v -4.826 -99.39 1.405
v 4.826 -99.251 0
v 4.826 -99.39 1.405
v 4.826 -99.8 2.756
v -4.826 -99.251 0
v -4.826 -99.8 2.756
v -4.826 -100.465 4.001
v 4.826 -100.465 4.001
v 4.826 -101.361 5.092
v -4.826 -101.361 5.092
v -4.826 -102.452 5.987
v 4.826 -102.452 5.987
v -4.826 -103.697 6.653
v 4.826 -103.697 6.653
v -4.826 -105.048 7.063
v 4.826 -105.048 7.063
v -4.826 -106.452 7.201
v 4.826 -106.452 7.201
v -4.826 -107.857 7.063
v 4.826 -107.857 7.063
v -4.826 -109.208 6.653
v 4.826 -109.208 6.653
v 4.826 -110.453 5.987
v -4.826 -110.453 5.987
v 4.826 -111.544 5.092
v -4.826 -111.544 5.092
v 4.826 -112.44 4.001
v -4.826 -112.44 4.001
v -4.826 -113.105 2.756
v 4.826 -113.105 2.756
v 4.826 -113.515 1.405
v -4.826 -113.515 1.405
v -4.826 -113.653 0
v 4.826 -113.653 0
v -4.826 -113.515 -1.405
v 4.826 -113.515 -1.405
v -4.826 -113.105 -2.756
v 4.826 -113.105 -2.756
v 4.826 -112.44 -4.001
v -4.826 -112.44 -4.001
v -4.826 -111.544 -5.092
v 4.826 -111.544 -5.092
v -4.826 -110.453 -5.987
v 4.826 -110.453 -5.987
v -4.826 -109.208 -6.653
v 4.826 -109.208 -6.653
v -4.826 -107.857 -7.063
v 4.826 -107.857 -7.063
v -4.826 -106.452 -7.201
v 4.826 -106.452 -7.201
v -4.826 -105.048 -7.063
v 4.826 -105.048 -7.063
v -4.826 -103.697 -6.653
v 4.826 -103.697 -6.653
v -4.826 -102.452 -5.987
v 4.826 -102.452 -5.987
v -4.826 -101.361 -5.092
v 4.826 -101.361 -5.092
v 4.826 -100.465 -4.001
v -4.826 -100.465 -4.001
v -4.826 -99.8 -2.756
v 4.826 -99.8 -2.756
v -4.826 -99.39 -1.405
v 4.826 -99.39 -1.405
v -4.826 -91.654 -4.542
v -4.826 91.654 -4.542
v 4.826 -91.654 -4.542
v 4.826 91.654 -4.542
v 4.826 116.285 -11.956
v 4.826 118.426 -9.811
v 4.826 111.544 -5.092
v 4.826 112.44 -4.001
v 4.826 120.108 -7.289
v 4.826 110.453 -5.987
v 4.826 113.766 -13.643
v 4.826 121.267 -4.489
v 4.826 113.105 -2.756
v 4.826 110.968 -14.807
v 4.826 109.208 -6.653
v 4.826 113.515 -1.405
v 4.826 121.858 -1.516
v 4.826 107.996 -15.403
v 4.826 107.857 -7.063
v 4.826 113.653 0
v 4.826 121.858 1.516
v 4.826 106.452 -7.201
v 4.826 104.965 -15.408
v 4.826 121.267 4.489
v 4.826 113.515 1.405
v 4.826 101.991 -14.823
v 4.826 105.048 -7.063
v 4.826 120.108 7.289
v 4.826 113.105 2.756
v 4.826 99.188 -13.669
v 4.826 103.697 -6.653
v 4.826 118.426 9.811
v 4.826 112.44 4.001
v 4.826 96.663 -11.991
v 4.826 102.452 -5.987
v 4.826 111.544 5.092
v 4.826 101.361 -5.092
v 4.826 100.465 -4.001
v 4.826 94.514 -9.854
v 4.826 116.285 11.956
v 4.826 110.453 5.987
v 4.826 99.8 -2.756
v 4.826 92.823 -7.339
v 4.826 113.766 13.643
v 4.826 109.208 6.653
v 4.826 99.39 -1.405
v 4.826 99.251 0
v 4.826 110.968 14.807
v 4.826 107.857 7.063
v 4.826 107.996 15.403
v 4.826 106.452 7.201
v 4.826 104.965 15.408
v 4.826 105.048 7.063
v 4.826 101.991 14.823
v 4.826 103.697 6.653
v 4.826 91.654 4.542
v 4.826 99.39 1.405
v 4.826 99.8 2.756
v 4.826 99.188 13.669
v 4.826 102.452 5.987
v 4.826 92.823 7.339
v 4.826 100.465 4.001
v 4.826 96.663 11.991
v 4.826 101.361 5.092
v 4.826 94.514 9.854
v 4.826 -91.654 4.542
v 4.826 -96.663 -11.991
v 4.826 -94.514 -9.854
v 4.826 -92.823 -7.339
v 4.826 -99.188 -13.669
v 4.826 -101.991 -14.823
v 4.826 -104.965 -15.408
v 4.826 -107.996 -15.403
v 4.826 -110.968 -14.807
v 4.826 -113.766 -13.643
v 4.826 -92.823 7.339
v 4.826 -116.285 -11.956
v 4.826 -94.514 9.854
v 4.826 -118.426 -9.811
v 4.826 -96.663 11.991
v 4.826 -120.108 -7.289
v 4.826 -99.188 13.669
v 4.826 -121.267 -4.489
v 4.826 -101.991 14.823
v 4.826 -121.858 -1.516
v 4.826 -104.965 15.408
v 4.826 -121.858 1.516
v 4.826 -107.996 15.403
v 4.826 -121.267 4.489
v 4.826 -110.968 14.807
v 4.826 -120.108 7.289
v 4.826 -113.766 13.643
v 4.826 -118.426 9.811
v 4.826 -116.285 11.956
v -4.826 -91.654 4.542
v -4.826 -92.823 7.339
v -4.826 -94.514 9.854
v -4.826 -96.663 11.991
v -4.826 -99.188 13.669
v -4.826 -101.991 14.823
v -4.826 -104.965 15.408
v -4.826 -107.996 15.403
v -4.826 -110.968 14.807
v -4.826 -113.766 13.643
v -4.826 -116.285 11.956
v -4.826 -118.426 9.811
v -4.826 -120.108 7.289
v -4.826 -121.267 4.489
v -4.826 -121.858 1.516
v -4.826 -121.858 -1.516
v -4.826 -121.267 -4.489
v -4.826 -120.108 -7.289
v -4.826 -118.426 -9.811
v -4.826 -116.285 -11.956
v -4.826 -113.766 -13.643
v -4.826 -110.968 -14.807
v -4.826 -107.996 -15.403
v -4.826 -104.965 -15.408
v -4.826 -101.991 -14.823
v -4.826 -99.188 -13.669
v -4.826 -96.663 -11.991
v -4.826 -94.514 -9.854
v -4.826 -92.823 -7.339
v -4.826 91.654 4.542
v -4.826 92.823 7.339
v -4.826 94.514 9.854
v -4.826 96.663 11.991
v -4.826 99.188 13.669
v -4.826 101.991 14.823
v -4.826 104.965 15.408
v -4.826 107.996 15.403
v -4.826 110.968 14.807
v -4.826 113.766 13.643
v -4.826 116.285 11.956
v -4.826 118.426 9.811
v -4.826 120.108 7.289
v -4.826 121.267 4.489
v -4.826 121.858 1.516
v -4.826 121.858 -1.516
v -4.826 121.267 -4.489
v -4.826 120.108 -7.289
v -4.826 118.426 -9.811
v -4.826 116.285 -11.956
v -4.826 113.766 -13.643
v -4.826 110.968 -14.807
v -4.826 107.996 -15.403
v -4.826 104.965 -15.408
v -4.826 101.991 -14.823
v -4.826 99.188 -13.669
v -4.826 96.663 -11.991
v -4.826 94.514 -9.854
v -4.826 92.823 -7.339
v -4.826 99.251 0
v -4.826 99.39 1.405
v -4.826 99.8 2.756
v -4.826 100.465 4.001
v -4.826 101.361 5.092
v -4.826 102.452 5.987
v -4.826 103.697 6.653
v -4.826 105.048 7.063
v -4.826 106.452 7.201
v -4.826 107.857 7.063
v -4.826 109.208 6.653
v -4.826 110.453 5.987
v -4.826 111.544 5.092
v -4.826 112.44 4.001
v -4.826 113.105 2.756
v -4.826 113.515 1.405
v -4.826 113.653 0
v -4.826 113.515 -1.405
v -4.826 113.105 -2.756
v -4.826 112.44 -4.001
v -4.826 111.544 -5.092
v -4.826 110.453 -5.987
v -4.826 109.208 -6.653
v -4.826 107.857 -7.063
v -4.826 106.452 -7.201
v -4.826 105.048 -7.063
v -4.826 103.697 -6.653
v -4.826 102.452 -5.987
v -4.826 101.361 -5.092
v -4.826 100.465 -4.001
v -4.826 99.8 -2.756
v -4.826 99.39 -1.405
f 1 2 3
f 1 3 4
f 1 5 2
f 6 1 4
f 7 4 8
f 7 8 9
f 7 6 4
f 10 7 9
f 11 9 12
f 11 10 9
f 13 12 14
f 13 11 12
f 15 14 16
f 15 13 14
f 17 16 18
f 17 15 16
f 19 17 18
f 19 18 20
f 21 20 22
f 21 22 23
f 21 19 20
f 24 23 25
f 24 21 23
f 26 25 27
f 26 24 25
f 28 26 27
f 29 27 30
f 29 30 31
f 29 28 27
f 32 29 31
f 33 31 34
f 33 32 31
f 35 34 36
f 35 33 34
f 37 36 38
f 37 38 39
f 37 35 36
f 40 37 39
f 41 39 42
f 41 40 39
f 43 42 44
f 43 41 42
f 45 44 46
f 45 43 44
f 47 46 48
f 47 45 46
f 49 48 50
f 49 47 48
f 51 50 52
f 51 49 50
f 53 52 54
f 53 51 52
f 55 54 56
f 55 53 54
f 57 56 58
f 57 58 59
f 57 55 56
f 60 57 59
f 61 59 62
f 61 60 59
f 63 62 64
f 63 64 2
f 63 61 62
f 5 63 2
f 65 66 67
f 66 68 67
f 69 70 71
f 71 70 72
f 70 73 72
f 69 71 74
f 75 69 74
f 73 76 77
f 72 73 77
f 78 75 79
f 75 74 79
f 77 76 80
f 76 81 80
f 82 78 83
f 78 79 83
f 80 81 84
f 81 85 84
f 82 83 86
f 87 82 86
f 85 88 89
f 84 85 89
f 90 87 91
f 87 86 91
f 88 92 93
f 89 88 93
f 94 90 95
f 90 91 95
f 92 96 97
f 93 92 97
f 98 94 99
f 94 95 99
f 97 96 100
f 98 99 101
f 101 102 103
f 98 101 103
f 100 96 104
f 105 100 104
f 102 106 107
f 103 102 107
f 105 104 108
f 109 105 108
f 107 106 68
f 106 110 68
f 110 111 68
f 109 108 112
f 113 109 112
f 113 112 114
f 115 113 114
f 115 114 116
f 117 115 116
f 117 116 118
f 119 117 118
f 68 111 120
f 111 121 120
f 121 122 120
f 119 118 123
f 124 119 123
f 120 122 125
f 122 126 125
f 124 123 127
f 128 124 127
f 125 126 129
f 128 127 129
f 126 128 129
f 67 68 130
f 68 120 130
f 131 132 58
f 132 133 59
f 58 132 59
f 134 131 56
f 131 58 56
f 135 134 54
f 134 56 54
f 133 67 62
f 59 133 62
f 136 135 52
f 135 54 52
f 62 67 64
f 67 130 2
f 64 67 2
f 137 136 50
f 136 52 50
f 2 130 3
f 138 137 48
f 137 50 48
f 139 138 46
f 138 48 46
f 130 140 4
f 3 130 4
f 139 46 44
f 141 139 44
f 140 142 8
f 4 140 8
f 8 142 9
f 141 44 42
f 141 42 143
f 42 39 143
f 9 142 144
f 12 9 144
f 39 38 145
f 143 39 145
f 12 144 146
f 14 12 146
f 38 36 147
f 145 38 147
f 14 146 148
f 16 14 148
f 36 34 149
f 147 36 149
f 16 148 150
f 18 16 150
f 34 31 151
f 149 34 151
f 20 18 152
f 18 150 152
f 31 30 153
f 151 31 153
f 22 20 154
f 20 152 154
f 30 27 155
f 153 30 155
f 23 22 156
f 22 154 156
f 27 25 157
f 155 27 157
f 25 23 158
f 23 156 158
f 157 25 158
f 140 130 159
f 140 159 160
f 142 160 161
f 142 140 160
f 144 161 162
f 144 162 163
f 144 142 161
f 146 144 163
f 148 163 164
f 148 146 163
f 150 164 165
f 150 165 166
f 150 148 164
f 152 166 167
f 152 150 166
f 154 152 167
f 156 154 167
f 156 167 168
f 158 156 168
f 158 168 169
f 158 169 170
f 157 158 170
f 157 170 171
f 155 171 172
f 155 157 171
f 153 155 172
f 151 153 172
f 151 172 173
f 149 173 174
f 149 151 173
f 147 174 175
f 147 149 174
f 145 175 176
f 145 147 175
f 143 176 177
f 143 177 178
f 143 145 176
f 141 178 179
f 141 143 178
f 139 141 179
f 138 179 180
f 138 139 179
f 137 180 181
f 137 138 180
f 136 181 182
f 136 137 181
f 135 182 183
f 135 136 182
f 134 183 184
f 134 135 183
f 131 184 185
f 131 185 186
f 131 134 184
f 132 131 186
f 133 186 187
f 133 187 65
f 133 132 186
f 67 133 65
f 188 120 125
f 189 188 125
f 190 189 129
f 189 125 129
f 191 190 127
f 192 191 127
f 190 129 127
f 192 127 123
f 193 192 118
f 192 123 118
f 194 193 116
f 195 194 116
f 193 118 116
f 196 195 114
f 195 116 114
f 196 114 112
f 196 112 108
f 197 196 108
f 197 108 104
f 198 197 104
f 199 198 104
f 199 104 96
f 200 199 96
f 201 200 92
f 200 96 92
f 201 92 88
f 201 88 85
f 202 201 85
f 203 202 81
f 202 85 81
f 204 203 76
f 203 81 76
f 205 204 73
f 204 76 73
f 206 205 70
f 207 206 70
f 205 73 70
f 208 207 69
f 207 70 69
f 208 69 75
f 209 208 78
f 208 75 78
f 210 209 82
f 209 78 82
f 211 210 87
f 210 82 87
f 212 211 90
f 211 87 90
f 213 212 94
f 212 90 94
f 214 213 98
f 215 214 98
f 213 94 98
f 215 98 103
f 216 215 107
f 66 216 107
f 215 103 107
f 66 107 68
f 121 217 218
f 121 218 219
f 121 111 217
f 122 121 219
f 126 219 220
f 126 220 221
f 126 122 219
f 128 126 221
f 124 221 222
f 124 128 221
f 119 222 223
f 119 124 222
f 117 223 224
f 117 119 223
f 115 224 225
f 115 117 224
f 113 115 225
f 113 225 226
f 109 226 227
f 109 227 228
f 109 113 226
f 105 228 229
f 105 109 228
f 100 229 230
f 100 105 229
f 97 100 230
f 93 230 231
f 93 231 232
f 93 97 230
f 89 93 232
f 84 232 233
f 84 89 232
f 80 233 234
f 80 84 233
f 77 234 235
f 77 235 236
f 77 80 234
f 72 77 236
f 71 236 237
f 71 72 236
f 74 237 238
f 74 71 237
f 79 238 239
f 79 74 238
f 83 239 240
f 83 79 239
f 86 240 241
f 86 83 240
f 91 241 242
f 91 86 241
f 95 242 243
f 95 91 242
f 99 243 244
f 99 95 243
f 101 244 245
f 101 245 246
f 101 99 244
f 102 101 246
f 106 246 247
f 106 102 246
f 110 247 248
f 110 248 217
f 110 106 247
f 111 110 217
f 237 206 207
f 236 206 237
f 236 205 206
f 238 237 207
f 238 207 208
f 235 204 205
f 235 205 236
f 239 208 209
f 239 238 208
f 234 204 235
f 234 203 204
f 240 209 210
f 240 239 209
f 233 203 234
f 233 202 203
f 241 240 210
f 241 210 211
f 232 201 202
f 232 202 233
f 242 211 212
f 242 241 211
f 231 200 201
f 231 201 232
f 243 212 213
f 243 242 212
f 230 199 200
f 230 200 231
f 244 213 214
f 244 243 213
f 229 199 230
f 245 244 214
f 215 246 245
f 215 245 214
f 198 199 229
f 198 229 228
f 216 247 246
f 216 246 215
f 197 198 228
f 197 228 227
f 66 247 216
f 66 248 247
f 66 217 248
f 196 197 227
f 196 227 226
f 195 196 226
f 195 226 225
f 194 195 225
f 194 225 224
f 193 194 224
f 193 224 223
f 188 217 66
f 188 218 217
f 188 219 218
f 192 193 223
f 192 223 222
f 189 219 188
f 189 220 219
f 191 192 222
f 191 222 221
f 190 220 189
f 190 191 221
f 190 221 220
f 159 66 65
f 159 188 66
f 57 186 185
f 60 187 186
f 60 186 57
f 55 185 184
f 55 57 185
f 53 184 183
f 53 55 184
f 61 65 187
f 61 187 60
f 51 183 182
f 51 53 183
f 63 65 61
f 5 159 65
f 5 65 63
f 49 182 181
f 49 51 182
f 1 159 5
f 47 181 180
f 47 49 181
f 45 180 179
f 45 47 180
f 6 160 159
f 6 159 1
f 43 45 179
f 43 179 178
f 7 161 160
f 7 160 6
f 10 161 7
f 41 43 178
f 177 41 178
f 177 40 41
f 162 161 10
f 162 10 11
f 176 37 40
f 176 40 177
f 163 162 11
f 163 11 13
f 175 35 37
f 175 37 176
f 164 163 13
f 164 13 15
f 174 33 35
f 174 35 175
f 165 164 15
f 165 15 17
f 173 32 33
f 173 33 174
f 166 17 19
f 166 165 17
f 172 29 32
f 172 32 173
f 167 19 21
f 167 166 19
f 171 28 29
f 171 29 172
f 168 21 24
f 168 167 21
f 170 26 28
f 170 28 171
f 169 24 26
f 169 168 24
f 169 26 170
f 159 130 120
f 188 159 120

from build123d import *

# Parameters (mm, degrees)
F0_R     = 7.201014
F1_DEPTH = 4.826


with BuildPart() as f1:
    # F0 (on Right) → F1 (new body)
    with BuildSketch(Plane.YZ):
        with BuildLine():
            Line((0, -4.541845), (0, 4.541845))
            Line((0, 4.541845), (-91.654071, 4.541845))
            ThreePointArc((-91.654071, 4.541845), (-121.932156, 0), (-91.654071, -4.541845))
            Line((-91.654071, -4.541845), (0, -4.541845))
        make_face()
        with Locations((-106.452465, 0)):
            Circle(F0_R, mode=Mode.SUBTRACT)
    extrude(amount=F1_DEPTH)

    # F2: F1 across plane


with BuildPart() as f1_1:
    add(f1.part)
    add(f1.part.mirror(Plane.YZ))

    # F3: F1 across plane


with BuildPart() as f1_2:
    add(f1_1.part)
    add(f1_1.part.mirror(Plane.XZ))


solid = f1_2.part
